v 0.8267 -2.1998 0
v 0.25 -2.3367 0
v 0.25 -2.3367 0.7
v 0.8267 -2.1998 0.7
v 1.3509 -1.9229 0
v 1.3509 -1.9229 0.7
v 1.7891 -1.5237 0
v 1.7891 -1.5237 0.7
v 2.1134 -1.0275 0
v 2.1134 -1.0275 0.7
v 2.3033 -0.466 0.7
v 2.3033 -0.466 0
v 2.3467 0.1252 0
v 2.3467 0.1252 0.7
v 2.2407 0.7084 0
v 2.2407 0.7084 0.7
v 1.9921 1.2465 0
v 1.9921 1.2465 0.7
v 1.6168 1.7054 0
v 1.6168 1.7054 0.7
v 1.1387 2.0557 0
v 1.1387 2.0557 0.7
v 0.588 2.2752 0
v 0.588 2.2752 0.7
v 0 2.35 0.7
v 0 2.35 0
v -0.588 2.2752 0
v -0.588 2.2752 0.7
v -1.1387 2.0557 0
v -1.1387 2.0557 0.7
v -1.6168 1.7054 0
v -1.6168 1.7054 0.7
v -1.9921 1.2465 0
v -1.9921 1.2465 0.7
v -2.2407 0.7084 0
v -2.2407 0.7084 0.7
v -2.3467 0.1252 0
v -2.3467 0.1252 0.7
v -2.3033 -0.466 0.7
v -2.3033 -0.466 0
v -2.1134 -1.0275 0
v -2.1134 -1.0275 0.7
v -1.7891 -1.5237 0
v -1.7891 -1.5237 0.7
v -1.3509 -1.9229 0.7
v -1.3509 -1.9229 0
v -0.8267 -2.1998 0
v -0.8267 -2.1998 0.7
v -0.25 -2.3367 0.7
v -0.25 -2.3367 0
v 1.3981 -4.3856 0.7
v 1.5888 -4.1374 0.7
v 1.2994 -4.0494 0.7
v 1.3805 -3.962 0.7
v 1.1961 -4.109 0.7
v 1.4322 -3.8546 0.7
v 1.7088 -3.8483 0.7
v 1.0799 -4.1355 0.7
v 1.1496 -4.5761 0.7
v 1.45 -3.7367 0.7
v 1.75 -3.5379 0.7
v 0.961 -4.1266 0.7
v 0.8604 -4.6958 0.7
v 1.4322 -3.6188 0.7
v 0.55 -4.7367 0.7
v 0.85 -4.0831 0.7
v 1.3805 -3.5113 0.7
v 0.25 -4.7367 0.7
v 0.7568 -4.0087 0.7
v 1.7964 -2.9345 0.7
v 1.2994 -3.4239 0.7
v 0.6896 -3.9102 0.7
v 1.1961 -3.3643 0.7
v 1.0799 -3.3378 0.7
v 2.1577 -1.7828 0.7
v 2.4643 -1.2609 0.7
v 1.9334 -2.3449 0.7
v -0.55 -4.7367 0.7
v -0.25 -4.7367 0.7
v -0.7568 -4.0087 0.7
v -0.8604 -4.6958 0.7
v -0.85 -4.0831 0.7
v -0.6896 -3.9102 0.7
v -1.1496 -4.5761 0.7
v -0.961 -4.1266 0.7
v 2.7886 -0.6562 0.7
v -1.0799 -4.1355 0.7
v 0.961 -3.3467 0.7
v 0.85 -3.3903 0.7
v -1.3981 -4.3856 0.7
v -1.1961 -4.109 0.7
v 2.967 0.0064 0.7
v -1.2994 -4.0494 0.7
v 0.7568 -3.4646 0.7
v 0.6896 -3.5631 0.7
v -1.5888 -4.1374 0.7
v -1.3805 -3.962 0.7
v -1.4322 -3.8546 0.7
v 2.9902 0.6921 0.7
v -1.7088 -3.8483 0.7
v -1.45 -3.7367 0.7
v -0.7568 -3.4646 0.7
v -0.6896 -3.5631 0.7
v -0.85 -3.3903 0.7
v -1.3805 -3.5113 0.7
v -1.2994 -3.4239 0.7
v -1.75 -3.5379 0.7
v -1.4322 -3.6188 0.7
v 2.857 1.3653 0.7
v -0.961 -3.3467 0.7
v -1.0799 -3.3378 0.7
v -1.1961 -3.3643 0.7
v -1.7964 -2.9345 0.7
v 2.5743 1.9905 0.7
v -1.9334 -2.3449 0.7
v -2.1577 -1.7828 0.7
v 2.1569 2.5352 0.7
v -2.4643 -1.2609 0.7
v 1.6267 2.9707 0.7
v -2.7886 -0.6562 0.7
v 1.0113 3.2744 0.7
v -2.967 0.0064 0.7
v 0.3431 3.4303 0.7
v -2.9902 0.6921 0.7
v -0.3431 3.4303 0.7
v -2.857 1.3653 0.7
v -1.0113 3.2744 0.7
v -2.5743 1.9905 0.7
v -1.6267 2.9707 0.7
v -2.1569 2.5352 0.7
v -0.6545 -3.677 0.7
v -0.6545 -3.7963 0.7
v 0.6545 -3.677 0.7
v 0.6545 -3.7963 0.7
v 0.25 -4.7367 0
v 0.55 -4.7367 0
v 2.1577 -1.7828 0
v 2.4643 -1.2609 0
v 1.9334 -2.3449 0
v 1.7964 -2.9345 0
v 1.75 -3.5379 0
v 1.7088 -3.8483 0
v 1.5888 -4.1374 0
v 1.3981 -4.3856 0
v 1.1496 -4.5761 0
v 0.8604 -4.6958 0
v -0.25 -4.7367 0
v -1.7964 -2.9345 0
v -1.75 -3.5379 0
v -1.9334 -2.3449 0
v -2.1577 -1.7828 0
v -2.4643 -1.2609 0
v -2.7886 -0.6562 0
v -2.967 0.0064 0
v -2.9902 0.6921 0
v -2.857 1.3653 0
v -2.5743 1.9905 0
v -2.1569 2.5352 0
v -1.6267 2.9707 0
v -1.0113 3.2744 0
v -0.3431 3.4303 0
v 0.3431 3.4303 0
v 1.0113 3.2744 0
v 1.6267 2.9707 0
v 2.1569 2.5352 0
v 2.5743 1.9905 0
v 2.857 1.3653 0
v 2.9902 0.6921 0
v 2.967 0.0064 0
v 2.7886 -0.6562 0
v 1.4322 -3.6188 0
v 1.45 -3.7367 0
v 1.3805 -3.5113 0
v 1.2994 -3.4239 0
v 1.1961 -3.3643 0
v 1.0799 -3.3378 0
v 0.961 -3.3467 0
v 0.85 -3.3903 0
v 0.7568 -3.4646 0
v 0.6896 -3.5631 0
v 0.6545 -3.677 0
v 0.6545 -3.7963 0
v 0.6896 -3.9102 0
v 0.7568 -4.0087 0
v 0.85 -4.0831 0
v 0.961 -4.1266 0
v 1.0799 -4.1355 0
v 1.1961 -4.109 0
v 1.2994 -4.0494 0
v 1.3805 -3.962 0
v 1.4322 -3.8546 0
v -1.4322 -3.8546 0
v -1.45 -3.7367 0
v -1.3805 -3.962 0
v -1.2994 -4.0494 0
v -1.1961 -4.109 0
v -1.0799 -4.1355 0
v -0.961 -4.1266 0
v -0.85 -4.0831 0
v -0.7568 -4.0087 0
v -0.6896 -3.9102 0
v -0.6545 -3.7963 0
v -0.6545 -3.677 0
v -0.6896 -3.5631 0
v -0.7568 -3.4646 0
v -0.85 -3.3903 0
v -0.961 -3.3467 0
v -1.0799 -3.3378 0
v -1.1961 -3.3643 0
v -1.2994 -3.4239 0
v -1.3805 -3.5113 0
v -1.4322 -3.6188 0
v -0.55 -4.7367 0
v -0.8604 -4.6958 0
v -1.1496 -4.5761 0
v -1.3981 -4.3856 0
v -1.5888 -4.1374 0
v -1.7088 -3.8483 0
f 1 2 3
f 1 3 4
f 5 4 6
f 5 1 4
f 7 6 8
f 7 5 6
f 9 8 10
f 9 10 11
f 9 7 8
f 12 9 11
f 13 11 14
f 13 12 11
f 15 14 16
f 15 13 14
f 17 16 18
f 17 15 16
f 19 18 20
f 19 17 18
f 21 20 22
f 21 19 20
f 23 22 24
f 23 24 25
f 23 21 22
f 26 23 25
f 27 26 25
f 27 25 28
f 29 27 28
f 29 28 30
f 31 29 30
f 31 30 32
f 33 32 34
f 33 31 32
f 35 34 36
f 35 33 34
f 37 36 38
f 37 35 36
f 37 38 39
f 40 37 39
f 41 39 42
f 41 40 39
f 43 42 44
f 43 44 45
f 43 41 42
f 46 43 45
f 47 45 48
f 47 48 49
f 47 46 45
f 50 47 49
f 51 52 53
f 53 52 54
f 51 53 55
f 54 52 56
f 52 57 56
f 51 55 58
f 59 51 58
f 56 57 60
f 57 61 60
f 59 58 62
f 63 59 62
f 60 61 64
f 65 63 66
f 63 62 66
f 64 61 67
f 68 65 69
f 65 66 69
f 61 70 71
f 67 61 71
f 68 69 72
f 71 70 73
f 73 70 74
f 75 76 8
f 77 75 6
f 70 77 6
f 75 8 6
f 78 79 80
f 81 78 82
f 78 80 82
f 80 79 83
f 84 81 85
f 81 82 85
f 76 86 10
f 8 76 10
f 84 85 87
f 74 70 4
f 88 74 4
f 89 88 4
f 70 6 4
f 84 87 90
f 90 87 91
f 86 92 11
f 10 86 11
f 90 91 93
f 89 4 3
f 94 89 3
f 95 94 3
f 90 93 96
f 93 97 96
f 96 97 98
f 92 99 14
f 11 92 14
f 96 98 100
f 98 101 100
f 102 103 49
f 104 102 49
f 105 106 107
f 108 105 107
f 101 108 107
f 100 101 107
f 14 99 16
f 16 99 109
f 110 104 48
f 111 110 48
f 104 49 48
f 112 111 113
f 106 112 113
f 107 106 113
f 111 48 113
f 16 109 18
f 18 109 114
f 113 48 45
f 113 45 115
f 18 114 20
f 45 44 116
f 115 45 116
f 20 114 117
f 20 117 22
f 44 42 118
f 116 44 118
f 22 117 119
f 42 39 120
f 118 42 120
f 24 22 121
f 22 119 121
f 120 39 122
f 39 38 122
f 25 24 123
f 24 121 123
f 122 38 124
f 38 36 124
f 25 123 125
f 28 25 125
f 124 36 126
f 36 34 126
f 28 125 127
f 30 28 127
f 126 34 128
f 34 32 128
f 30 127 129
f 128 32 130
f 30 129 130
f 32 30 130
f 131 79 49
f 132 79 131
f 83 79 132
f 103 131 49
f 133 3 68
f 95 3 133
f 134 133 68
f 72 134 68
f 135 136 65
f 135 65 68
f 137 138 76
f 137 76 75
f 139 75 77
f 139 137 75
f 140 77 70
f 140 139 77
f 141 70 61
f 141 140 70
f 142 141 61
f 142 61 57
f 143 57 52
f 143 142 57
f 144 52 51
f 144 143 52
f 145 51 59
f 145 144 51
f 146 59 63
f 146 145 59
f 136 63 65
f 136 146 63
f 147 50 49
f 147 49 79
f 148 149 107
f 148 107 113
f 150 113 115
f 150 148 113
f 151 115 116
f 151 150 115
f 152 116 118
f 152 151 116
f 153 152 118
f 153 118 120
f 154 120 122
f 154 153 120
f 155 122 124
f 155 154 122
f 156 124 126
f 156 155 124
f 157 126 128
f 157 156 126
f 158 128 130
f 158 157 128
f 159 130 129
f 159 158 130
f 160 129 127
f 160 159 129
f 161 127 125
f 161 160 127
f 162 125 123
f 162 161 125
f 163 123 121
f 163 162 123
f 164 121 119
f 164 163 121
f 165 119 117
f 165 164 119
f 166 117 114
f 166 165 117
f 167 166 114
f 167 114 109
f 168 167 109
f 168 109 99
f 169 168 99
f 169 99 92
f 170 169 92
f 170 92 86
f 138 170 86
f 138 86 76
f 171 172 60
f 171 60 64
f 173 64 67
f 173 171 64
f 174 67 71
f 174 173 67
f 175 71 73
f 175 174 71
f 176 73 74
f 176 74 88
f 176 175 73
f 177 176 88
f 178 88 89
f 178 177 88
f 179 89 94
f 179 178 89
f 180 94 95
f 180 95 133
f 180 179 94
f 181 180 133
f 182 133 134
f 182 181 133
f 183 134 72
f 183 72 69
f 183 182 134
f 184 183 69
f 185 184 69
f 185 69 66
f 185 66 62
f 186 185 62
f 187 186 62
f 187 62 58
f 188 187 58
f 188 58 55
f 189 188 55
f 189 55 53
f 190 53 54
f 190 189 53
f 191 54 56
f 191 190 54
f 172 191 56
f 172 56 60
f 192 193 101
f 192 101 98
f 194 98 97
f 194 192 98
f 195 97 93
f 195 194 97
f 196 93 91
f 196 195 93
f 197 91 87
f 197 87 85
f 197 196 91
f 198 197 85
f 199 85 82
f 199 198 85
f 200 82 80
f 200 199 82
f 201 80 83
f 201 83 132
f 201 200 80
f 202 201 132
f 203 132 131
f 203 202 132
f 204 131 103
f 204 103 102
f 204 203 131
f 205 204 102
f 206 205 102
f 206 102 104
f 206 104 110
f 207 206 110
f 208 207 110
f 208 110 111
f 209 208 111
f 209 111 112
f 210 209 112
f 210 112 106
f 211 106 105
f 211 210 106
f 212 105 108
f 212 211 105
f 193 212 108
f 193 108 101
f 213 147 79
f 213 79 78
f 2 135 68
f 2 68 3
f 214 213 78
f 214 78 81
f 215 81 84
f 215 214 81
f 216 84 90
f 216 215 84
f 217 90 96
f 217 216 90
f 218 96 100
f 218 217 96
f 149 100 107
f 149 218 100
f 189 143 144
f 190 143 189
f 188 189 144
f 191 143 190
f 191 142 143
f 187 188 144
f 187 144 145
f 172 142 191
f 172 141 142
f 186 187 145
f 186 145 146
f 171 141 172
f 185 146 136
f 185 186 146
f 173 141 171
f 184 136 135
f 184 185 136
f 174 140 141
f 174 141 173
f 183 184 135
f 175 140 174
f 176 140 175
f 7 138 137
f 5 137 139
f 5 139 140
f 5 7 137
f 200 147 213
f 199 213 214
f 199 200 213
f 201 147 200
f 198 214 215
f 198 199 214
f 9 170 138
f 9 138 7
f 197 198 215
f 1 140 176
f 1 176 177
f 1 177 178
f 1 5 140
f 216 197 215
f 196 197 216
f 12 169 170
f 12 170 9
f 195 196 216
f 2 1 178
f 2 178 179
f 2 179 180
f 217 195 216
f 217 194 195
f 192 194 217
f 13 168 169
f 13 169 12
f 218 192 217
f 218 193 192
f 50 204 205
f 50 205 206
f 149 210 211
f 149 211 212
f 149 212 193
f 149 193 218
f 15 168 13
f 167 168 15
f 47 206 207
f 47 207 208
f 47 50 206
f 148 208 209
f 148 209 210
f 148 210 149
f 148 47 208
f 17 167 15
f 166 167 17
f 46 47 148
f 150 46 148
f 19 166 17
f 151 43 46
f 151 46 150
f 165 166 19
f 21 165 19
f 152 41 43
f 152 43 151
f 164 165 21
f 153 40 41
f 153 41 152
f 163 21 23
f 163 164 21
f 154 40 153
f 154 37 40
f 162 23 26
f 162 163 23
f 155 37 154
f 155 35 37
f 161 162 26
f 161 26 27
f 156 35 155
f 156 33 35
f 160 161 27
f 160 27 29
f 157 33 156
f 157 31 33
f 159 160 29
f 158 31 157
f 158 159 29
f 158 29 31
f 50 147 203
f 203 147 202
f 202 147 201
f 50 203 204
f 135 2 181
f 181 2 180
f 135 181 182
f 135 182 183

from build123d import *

# Parameters (mm, degrees)
SKETCH_1_R      = 0.4
EXTRUDE_1_DEPTH = 0.7


with BuildPart() as part:
    # 草图1 → 凸台-拉伸1 (new body)
    with BuildSketch(Plane.XY):
        with BuildLine():
            Line((-0.25, -2.336664289), (-0.25, -4.736664289))
            Line((-0.25, -4.736664289), (-0.55, -4.736664289))
            ThreePointArc((-0.55, -4.736664289), (-1.398077663, -4.385642662), (-1.749999324, -3.537938086))
            ThreePointArc((-1.749999324, -3.537938086), (-1.933378352, -2.344928231), (-2.464284459, -1.260936032))
            ThreePointArc((-2.464284459, -1.260936032), (0, 3.45), (2.464284459, -1.260936032))
            ThreePointArc((2.464284459, -1.260936032), (1.933378352, -2.344928231), (1.749999324, -3.537938086))
            ThreePointArc((1.749999324, -3.537938086), (1.398077663, -4.385642662), (0.55, -4.736664289))
            Line((0.55, -4.736664289), (0.25, -4.736664289))
            Line((0.25, -4.736664289), (0.25, -2.336664289))
            ThreePointArc((0.25, -2.336664289), (0, 2.35), (-0.25, -2.336664289))
        make_face()
        with Locations(Location((-1.05, -3.736664289, 0), (0, 0, 180))):
            Circle(SKETCH_1_R, mode=Mode.SUBTRACT)
        with Locations((1.05, -3.736664289)):
            Circle(SKETCH_1_R, mode=Mode.SUBTRACT)
    extrude(amount=EXTRUDE_1_DEPTH)


solid = part.part
